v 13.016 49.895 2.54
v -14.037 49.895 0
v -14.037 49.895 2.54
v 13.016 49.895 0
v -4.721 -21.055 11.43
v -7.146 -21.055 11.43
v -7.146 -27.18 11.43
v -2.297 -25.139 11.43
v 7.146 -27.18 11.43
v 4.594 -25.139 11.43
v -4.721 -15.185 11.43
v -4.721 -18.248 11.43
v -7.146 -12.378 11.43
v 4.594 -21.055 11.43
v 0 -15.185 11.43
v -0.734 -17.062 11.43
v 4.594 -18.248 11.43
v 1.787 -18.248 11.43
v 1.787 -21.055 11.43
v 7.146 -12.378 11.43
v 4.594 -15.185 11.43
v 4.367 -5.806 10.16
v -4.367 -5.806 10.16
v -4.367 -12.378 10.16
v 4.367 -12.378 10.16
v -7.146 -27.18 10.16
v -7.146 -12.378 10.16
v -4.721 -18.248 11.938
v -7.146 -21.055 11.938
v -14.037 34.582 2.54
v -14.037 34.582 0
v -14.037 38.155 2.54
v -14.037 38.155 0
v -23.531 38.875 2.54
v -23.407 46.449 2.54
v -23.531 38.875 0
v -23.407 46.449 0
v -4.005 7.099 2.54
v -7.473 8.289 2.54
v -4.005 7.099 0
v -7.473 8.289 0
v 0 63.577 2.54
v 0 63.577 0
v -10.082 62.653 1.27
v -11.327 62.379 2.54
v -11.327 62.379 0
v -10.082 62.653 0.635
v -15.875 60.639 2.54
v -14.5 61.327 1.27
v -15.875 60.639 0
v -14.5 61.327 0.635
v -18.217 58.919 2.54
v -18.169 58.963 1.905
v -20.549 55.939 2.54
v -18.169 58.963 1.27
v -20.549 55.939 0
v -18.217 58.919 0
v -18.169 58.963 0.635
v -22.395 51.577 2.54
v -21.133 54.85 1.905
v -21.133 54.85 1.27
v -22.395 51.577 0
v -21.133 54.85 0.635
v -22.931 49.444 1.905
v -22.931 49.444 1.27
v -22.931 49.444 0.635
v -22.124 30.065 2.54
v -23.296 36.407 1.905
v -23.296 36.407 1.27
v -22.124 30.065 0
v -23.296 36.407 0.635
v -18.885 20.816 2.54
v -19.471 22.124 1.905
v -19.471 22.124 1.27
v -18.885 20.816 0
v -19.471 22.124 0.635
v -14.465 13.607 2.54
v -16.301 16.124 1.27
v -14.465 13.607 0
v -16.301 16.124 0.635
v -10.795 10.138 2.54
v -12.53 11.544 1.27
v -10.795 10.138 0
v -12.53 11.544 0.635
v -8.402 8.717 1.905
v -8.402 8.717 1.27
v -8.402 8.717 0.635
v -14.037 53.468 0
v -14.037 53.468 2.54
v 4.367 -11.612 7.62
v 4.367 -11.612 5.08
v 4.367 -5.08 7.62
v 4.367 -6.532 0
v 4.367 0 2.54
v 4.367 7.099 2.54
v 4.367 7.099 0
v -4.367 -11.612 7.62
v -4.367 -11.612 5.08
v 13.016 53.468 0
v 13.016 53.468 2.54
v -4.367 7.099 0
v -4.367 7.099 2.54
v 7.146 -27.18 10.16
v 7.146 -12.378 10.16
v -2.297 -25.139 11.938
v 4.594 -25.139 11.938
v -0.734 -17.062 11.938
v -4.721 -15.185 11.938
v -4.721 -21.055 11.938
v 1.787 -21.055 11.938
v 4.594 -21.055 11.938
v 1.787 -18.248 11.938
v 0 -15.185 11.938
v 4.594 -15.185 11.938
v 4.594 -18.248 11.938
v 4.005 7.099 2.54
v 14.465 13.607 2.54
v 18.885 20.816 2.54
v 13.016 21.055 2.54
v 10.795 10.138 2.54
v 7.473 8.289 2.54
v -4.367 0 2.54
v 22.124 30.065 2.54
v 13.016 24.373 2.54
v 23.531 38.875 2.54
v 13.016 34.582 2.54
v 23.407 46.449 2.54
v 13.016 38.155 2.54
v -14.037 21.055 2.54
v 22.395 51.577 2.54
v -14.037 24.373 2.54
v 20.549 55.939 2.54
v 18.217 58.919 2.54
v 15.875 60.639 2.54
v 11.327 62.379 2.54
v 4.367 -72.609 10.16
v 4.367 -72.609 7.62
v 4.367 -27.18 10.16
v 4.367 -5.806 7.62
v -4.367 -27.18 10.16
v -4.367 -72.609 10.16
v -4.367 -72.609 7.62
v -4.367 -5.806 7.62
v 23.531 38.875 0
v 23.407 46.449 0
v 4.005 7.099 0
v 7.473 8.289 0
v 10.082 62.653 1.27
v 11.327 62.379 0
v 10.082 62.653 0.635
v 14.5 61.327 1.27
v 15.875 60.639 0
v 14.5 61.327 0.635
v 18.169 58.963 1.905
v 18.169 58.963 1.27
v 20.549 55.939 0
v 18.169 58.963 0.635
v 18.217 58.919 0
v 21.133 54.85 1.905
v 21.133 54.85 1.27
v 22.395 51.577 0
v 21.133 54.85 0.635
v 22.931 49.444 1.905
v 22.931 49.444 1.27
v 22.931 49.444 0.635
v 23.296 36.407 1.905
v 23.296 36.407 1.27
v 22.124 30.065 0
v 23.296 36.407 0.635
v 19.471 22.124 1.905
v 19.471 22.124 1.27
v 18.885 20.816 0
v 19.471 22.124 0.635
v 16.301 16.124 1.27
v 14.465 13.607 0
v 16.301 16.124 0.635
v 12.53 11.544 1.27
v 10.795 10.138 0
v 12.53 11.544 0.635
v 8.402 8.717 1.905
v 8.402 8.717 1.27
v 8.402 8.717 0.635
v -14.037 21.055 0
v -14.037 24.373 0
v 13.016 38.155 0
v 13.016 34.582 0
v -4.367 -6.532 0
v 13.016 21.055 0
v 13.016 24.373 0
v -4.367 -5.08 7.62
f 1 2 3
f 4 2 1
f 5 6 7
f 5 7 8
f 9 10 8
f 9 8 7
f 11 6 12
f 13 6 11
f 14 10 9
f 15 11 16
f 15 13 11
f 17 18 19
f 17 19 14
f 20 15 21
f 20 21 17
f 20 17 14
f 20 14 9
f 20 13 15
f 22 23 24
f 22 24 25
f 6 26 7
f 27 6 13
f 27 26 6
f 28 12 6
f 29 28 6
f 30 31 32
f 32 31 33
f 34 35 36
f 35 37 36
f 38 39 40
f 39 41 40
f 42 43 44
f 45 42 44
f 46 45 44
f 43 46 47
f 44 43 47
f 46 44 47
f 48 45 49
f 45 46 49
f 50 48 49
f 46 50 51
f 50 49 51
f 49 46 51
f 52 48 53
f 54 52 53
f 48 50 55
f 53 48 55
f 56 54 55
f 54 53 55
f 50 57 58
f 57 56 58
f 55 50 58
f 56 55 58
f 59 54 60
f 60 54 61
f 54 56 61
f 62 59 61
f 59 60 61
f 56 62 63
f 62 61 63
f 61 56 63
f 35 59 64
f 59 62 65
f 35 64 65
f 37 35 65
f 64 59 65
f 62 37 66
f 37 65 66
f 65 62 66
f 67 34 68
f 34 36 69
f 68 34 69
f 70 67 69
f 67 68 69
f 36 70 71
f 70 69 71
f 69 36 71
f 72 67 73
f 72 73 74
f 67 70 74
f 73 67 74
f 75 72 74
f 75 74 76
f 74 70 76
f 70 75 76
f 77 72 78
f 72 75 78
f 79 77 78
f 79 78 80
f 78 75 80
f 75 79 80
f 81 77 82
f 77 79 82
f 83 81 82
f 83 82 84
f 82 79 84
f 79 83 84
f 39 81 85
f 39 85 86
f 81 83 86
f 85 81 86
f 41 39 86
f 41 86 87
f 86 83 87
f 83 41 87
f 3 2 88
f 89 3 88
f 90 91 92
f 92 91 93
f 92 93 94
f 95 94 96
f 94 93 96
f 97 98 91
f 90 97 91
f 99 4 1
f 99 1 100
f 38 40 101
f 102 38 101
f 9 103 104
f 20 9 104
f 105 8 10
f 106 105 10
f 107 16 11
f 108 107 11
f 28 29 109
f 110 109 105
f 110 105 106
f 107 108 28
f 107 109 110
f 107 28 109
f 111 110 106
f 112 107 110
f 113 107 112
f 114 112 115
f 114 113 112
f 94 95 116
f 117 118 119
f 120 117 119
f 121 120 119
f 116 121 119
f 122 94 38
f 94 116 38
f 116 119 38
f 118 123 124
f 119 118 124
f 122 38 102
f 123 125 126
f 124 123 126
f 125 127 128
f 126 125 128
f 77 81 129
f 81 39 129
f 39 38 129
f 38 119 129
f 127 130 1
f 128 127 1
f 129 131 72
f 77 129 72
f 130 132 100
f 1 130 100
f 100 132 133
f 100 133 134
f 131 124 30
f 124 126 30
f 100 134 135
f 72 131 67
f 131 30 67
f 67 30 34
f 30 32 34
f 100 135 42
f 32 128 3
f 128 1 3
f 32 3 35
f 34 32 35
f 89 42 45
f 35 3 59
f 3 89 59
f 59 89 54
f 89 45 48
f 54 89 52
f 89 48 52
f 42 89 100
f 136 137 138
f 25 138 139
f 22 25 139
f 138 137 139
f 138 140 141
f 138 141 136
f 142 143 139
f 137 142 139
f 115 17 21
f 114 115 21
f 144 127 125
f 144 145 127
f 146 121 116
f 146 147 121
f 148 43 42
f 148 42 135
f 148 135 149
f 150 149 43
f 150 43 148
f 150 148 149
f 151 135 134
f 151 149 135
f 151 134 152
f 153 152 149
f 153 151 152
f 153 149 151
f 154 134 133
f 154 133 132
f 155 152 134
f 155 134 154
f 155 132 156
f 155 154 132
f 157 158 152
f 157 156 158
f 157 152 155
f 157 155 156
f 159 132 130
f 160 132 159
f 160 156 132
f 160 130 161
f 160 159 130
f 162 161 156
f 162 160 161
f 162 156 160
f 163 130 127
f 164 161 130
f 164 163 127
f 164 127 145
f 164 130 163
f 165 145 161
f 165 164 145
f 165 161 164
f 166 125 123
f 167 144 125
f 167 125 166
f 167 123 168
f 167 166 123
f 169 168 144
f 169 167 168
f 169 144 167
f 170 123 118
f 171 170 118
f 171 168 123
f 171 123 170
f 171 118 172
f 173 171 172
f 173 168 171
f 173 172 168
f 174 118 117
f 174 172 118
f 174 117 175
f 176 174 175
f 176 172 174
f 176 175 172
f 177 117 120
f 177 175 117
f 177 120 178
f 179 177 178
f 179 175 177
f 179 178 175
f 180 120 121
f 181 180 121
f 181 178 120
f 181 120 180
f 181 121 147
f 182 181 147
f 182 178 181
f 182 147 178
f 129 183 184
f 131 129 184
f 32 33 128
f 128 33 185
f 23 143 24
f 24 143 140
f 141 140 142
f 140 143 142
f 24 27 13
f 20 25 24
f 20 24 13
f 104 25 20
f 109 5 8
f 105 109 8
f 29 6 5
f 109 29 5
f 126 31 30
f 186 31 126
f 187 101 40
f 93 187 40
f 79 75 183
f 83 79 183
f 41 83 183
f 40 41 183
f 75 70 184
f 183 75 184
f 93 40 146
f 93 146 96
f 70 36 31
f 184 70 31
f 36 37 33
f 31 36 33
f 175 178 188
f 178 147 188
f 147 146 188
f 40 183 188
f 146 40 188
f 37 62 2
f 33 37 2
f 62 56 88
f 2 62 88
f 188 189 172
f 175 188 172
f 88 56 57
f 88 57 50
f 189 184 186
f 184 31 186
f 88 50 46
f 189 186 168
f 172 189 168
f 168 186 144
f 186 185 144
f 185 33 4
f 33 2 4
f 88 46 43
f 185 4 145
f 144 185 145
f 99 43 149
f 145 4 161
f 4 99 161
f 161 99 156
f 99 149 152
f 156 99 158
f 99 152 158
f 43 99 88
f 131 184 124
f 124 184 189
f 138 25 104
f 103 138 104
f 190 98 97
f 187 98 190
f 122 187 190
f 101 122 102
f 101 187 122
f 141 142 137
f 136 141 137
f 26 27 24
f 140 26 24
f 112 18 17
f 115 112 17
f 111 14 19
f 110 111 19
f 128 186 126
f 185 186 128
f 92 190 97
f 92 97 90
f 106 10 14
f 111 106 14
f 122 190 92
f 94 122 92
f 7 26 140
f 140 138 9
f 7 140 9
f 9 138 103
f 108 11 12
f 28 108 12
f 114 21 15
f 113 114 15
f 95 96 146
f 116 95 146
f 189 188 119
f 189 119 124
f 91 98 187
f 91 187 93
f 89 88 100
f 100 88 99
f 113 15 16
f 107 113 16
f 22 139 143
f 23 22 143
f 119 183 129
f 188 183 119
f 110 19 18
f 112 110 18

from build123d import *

# Parameters (mm, degrees)
F0_W     = 27.0528234541
F0_H     = 3.3177994192
F0_H_2   = 3.5730116069
F0_H_3   = 3.5730153322
F1_DEPTH = 2.54
F0_W_2   = 8.7334977924
F0_H_4   = 11.6122970358
F2_DEPTH = 7.62
F4_DEPTH = 2.54
F5_SIZE  = 5.07999
F6_W     = 14.2920585349
F6_H     = 14.8024894297
F7_DEPTH = 1.27
F9_DEPTH = 0.508


# Not quite as in the source:
# - a fillet or chamfer is up to 0.001 mm smaller than in the source, because OpenCascade refuses the exact size


with BuildPart() as f1:
    # F0 (on Top) → F1 (new body)
    with BuildSketch(Plane.XY):
        with BuildLine():
            add(Edge.make_bspline(
                [(0, 63.577234745), (6.943171273, 63.2683845738), (21.5991155841, 62.6164503593), (25.9966448984, 35.8068070443), (15.8071406297, 11.5475044882), (6.9938303995, 7.9173166599), (4.0047332195, 7.0992700308)],
                knots=[0, 0, 0, 0, 0.2400386989, 0.5066840016, 0.7952644813, 0.9371547504, 0.9371547504, 0.9371547504, 0.9371547504], degree=3))
            add(Edge.make_bspline(
                [(0, 63.577234745), (-6.943171273, 63.2683845738), (-21.5991155841, 62.6164503593), (-25.9966448984, 35.8068070443), (-15.8071406297, 11.5475044882), (-6.9938303995, 7.9173166599), (-4.0047332195, 7.0992700308)],
                knots=[0, 0, 0, 0, 0.2400386989, 0.5066840016, 0.7952644813, 0.9371547504, 0.9371547504, 0.9371547504, 0.9371547504], degree=3))
            Line((-4.0047332195, 7.0992700308), (4.0047332195, 7.0992700308))
        make_face()
        with Locations((-0.5104308948, 22.714164108)):
            Rectangle(F0_W, F0_H, mode=Mode.SUBTRACT)
        with Locations((-0.5104308948, 36.368181929)):
            Rectangle(F0_W, F0_H_2, mode=Mode.SUBTRACT)
        with Locations((-0.5104308948, 51.6811013222)):
            Rectangle(F0_W, F0_H_3, mode=Mode.SUBTRACT)
        with BuildLine():
            Line((4.0047332195, 7.0992700308), (-4.0047332195, 7.0992700308))
            add(Edge.make_bspline(
                [(-4.0047332195, 7.0992700308), (-2.6808189042, 6.736945363), (-1.3404094521, 6.4488768122), (0, 6.1608082615)],
                knots=[0.9371547504, 0.9371547504, 0.9371547504, 0.9371547504, 1, 1, 1, 1], degree=3))
            add(Edge.make_bspline(
                [(4.0047332195, 7.0992700308), (2.6808189042, 6.736945363), (1.3404094521, 6.4488768122), (0, 6.1608082615)],
                knots=[0.9371547504, 0.9371547504, 0.9371547504, 0.9371547504, 1, 1, 1, 1], degree=3))
        make_face()
        with BuildLine():
            add(Edge.make_bspline(
                [(-4.0047332195, 7.0992700308), (-2.6808189042, 6.736945363), (-1.3404094521, 6.4488768122), (0, 6.1608082615)],
                knots=[0.9371547504, 0.9371547504, 0.9371547504, 0.9371547504, 1, 1, 1, 1], degree=3))
            Line((-4.0047332195, 7.0992700308), (-4.3667488962, 7.0992700308))
            Line((-4.3667488962, 7.0992700308), (-4.3667488962, 0))
            Line((-4.3667488962, 0), (4.3667488962, 0))
            Line((4.3667488962, 0), (4.3667488962, 7.0992700308))
            Line((4.3667488962, 7.0992700308), (4.0047332195, 7.0992700308))
            add(Edge.make_bspline(
                [(4.0047332195, 7.0992700308), (2.6808189042, 6.736945363), (1.3404094521, 6.4488768122), (0, 6.1608082615)],
                knots=[0.9371547504, 0.9371547504, 0.9371547504, 0.9371547504, 1, 1, 1, 1], degree=3))
        make_face()
    extrude(amount=F1_DEPTH)

    # F0 (on Top) → F2 (join)
    with BuildSketch(Plane.XY):
        with Locations((0, -5.8061485179)):
            Rectangle(F0_W_2, F0_H_4)
    extrude(amount=F2_DEPTH)

    # F5 (size 5.08 in the source; OpenCascade refuses exactly that, so slightly less here)
    f5_edges = [f1.edges().sort_by_distance(p)[0] for p in [
        (0, -11.612297, 0),
        (0, 0, 7.62),
    ]]
    chamfer(f5_edges, length=F5_SIZE)


with BuildPart() as f4:
    # F3 (on face) → F4 (new body)
    with BuildSketch(Plane.XY.offset(7.62)):
        Polygon((4.3667488962, -5.8061485179), (-4.3667488962, -5.8061485179), (-4.3667488962, -72.6087614894), (4.3667488962, -72.6087614894), (4.3667488962, -70.3118219972), align=None)
    extrude(amount=F4_DEPTH)

    # F6 (on face) → F7 (join)
    with BuildSketch(Plane.XY.offset(10.16)):
        with Locations((0, -19.7791866958)):
            Rectangle(F6_W, F6_H)
    extrude(amount=F7_DEPTH)

    # F8 (on face) → F9 (join)
    with BuildSketch(Plane.XY.offset(11.43)):
        Polygon((4.5938747935, -15.1853114367), (0, -15.1853114367), (-0.7342260891, -17.0616675849), (1.7865073169, -18.2478949428), (4.5938747935, -18.2478949428), align=None)
        Polygon((-2.2969373967, -21.0552643985), (-0.7342260891, -17.0616675849), (-4.7214833321, -15.1853114367), (-4.7214833321, -18.2478949428), (-7.1460292675, -21.0552643985), (-4.7214833321, -21.0552643985), align=None)
        Polygon((1.7865073169, -18.2478949428), (-0.7342260891, -17.0616675849), (-2.2969373967, -21.0552643985), (4.5938747935, -25.1387096941), (4.5938747935, -21.0552643985), (1.7865073169, -21.0552643985), align=None)
        Polygon((4.5938747935, -25.1387096941), (-2.2969373967, -21.0552643985), (-2.2969373967, -25.1387096941), align=None)
        Polygon((-2.2969373967, -25.1387096941), (-2.2969373967, -21.0552643985), (-4.7214833321, -21.0552643985), align=None)
    extrude(amount=F9_DEPTH)


solid = Compound([f1.part, f4.part])
